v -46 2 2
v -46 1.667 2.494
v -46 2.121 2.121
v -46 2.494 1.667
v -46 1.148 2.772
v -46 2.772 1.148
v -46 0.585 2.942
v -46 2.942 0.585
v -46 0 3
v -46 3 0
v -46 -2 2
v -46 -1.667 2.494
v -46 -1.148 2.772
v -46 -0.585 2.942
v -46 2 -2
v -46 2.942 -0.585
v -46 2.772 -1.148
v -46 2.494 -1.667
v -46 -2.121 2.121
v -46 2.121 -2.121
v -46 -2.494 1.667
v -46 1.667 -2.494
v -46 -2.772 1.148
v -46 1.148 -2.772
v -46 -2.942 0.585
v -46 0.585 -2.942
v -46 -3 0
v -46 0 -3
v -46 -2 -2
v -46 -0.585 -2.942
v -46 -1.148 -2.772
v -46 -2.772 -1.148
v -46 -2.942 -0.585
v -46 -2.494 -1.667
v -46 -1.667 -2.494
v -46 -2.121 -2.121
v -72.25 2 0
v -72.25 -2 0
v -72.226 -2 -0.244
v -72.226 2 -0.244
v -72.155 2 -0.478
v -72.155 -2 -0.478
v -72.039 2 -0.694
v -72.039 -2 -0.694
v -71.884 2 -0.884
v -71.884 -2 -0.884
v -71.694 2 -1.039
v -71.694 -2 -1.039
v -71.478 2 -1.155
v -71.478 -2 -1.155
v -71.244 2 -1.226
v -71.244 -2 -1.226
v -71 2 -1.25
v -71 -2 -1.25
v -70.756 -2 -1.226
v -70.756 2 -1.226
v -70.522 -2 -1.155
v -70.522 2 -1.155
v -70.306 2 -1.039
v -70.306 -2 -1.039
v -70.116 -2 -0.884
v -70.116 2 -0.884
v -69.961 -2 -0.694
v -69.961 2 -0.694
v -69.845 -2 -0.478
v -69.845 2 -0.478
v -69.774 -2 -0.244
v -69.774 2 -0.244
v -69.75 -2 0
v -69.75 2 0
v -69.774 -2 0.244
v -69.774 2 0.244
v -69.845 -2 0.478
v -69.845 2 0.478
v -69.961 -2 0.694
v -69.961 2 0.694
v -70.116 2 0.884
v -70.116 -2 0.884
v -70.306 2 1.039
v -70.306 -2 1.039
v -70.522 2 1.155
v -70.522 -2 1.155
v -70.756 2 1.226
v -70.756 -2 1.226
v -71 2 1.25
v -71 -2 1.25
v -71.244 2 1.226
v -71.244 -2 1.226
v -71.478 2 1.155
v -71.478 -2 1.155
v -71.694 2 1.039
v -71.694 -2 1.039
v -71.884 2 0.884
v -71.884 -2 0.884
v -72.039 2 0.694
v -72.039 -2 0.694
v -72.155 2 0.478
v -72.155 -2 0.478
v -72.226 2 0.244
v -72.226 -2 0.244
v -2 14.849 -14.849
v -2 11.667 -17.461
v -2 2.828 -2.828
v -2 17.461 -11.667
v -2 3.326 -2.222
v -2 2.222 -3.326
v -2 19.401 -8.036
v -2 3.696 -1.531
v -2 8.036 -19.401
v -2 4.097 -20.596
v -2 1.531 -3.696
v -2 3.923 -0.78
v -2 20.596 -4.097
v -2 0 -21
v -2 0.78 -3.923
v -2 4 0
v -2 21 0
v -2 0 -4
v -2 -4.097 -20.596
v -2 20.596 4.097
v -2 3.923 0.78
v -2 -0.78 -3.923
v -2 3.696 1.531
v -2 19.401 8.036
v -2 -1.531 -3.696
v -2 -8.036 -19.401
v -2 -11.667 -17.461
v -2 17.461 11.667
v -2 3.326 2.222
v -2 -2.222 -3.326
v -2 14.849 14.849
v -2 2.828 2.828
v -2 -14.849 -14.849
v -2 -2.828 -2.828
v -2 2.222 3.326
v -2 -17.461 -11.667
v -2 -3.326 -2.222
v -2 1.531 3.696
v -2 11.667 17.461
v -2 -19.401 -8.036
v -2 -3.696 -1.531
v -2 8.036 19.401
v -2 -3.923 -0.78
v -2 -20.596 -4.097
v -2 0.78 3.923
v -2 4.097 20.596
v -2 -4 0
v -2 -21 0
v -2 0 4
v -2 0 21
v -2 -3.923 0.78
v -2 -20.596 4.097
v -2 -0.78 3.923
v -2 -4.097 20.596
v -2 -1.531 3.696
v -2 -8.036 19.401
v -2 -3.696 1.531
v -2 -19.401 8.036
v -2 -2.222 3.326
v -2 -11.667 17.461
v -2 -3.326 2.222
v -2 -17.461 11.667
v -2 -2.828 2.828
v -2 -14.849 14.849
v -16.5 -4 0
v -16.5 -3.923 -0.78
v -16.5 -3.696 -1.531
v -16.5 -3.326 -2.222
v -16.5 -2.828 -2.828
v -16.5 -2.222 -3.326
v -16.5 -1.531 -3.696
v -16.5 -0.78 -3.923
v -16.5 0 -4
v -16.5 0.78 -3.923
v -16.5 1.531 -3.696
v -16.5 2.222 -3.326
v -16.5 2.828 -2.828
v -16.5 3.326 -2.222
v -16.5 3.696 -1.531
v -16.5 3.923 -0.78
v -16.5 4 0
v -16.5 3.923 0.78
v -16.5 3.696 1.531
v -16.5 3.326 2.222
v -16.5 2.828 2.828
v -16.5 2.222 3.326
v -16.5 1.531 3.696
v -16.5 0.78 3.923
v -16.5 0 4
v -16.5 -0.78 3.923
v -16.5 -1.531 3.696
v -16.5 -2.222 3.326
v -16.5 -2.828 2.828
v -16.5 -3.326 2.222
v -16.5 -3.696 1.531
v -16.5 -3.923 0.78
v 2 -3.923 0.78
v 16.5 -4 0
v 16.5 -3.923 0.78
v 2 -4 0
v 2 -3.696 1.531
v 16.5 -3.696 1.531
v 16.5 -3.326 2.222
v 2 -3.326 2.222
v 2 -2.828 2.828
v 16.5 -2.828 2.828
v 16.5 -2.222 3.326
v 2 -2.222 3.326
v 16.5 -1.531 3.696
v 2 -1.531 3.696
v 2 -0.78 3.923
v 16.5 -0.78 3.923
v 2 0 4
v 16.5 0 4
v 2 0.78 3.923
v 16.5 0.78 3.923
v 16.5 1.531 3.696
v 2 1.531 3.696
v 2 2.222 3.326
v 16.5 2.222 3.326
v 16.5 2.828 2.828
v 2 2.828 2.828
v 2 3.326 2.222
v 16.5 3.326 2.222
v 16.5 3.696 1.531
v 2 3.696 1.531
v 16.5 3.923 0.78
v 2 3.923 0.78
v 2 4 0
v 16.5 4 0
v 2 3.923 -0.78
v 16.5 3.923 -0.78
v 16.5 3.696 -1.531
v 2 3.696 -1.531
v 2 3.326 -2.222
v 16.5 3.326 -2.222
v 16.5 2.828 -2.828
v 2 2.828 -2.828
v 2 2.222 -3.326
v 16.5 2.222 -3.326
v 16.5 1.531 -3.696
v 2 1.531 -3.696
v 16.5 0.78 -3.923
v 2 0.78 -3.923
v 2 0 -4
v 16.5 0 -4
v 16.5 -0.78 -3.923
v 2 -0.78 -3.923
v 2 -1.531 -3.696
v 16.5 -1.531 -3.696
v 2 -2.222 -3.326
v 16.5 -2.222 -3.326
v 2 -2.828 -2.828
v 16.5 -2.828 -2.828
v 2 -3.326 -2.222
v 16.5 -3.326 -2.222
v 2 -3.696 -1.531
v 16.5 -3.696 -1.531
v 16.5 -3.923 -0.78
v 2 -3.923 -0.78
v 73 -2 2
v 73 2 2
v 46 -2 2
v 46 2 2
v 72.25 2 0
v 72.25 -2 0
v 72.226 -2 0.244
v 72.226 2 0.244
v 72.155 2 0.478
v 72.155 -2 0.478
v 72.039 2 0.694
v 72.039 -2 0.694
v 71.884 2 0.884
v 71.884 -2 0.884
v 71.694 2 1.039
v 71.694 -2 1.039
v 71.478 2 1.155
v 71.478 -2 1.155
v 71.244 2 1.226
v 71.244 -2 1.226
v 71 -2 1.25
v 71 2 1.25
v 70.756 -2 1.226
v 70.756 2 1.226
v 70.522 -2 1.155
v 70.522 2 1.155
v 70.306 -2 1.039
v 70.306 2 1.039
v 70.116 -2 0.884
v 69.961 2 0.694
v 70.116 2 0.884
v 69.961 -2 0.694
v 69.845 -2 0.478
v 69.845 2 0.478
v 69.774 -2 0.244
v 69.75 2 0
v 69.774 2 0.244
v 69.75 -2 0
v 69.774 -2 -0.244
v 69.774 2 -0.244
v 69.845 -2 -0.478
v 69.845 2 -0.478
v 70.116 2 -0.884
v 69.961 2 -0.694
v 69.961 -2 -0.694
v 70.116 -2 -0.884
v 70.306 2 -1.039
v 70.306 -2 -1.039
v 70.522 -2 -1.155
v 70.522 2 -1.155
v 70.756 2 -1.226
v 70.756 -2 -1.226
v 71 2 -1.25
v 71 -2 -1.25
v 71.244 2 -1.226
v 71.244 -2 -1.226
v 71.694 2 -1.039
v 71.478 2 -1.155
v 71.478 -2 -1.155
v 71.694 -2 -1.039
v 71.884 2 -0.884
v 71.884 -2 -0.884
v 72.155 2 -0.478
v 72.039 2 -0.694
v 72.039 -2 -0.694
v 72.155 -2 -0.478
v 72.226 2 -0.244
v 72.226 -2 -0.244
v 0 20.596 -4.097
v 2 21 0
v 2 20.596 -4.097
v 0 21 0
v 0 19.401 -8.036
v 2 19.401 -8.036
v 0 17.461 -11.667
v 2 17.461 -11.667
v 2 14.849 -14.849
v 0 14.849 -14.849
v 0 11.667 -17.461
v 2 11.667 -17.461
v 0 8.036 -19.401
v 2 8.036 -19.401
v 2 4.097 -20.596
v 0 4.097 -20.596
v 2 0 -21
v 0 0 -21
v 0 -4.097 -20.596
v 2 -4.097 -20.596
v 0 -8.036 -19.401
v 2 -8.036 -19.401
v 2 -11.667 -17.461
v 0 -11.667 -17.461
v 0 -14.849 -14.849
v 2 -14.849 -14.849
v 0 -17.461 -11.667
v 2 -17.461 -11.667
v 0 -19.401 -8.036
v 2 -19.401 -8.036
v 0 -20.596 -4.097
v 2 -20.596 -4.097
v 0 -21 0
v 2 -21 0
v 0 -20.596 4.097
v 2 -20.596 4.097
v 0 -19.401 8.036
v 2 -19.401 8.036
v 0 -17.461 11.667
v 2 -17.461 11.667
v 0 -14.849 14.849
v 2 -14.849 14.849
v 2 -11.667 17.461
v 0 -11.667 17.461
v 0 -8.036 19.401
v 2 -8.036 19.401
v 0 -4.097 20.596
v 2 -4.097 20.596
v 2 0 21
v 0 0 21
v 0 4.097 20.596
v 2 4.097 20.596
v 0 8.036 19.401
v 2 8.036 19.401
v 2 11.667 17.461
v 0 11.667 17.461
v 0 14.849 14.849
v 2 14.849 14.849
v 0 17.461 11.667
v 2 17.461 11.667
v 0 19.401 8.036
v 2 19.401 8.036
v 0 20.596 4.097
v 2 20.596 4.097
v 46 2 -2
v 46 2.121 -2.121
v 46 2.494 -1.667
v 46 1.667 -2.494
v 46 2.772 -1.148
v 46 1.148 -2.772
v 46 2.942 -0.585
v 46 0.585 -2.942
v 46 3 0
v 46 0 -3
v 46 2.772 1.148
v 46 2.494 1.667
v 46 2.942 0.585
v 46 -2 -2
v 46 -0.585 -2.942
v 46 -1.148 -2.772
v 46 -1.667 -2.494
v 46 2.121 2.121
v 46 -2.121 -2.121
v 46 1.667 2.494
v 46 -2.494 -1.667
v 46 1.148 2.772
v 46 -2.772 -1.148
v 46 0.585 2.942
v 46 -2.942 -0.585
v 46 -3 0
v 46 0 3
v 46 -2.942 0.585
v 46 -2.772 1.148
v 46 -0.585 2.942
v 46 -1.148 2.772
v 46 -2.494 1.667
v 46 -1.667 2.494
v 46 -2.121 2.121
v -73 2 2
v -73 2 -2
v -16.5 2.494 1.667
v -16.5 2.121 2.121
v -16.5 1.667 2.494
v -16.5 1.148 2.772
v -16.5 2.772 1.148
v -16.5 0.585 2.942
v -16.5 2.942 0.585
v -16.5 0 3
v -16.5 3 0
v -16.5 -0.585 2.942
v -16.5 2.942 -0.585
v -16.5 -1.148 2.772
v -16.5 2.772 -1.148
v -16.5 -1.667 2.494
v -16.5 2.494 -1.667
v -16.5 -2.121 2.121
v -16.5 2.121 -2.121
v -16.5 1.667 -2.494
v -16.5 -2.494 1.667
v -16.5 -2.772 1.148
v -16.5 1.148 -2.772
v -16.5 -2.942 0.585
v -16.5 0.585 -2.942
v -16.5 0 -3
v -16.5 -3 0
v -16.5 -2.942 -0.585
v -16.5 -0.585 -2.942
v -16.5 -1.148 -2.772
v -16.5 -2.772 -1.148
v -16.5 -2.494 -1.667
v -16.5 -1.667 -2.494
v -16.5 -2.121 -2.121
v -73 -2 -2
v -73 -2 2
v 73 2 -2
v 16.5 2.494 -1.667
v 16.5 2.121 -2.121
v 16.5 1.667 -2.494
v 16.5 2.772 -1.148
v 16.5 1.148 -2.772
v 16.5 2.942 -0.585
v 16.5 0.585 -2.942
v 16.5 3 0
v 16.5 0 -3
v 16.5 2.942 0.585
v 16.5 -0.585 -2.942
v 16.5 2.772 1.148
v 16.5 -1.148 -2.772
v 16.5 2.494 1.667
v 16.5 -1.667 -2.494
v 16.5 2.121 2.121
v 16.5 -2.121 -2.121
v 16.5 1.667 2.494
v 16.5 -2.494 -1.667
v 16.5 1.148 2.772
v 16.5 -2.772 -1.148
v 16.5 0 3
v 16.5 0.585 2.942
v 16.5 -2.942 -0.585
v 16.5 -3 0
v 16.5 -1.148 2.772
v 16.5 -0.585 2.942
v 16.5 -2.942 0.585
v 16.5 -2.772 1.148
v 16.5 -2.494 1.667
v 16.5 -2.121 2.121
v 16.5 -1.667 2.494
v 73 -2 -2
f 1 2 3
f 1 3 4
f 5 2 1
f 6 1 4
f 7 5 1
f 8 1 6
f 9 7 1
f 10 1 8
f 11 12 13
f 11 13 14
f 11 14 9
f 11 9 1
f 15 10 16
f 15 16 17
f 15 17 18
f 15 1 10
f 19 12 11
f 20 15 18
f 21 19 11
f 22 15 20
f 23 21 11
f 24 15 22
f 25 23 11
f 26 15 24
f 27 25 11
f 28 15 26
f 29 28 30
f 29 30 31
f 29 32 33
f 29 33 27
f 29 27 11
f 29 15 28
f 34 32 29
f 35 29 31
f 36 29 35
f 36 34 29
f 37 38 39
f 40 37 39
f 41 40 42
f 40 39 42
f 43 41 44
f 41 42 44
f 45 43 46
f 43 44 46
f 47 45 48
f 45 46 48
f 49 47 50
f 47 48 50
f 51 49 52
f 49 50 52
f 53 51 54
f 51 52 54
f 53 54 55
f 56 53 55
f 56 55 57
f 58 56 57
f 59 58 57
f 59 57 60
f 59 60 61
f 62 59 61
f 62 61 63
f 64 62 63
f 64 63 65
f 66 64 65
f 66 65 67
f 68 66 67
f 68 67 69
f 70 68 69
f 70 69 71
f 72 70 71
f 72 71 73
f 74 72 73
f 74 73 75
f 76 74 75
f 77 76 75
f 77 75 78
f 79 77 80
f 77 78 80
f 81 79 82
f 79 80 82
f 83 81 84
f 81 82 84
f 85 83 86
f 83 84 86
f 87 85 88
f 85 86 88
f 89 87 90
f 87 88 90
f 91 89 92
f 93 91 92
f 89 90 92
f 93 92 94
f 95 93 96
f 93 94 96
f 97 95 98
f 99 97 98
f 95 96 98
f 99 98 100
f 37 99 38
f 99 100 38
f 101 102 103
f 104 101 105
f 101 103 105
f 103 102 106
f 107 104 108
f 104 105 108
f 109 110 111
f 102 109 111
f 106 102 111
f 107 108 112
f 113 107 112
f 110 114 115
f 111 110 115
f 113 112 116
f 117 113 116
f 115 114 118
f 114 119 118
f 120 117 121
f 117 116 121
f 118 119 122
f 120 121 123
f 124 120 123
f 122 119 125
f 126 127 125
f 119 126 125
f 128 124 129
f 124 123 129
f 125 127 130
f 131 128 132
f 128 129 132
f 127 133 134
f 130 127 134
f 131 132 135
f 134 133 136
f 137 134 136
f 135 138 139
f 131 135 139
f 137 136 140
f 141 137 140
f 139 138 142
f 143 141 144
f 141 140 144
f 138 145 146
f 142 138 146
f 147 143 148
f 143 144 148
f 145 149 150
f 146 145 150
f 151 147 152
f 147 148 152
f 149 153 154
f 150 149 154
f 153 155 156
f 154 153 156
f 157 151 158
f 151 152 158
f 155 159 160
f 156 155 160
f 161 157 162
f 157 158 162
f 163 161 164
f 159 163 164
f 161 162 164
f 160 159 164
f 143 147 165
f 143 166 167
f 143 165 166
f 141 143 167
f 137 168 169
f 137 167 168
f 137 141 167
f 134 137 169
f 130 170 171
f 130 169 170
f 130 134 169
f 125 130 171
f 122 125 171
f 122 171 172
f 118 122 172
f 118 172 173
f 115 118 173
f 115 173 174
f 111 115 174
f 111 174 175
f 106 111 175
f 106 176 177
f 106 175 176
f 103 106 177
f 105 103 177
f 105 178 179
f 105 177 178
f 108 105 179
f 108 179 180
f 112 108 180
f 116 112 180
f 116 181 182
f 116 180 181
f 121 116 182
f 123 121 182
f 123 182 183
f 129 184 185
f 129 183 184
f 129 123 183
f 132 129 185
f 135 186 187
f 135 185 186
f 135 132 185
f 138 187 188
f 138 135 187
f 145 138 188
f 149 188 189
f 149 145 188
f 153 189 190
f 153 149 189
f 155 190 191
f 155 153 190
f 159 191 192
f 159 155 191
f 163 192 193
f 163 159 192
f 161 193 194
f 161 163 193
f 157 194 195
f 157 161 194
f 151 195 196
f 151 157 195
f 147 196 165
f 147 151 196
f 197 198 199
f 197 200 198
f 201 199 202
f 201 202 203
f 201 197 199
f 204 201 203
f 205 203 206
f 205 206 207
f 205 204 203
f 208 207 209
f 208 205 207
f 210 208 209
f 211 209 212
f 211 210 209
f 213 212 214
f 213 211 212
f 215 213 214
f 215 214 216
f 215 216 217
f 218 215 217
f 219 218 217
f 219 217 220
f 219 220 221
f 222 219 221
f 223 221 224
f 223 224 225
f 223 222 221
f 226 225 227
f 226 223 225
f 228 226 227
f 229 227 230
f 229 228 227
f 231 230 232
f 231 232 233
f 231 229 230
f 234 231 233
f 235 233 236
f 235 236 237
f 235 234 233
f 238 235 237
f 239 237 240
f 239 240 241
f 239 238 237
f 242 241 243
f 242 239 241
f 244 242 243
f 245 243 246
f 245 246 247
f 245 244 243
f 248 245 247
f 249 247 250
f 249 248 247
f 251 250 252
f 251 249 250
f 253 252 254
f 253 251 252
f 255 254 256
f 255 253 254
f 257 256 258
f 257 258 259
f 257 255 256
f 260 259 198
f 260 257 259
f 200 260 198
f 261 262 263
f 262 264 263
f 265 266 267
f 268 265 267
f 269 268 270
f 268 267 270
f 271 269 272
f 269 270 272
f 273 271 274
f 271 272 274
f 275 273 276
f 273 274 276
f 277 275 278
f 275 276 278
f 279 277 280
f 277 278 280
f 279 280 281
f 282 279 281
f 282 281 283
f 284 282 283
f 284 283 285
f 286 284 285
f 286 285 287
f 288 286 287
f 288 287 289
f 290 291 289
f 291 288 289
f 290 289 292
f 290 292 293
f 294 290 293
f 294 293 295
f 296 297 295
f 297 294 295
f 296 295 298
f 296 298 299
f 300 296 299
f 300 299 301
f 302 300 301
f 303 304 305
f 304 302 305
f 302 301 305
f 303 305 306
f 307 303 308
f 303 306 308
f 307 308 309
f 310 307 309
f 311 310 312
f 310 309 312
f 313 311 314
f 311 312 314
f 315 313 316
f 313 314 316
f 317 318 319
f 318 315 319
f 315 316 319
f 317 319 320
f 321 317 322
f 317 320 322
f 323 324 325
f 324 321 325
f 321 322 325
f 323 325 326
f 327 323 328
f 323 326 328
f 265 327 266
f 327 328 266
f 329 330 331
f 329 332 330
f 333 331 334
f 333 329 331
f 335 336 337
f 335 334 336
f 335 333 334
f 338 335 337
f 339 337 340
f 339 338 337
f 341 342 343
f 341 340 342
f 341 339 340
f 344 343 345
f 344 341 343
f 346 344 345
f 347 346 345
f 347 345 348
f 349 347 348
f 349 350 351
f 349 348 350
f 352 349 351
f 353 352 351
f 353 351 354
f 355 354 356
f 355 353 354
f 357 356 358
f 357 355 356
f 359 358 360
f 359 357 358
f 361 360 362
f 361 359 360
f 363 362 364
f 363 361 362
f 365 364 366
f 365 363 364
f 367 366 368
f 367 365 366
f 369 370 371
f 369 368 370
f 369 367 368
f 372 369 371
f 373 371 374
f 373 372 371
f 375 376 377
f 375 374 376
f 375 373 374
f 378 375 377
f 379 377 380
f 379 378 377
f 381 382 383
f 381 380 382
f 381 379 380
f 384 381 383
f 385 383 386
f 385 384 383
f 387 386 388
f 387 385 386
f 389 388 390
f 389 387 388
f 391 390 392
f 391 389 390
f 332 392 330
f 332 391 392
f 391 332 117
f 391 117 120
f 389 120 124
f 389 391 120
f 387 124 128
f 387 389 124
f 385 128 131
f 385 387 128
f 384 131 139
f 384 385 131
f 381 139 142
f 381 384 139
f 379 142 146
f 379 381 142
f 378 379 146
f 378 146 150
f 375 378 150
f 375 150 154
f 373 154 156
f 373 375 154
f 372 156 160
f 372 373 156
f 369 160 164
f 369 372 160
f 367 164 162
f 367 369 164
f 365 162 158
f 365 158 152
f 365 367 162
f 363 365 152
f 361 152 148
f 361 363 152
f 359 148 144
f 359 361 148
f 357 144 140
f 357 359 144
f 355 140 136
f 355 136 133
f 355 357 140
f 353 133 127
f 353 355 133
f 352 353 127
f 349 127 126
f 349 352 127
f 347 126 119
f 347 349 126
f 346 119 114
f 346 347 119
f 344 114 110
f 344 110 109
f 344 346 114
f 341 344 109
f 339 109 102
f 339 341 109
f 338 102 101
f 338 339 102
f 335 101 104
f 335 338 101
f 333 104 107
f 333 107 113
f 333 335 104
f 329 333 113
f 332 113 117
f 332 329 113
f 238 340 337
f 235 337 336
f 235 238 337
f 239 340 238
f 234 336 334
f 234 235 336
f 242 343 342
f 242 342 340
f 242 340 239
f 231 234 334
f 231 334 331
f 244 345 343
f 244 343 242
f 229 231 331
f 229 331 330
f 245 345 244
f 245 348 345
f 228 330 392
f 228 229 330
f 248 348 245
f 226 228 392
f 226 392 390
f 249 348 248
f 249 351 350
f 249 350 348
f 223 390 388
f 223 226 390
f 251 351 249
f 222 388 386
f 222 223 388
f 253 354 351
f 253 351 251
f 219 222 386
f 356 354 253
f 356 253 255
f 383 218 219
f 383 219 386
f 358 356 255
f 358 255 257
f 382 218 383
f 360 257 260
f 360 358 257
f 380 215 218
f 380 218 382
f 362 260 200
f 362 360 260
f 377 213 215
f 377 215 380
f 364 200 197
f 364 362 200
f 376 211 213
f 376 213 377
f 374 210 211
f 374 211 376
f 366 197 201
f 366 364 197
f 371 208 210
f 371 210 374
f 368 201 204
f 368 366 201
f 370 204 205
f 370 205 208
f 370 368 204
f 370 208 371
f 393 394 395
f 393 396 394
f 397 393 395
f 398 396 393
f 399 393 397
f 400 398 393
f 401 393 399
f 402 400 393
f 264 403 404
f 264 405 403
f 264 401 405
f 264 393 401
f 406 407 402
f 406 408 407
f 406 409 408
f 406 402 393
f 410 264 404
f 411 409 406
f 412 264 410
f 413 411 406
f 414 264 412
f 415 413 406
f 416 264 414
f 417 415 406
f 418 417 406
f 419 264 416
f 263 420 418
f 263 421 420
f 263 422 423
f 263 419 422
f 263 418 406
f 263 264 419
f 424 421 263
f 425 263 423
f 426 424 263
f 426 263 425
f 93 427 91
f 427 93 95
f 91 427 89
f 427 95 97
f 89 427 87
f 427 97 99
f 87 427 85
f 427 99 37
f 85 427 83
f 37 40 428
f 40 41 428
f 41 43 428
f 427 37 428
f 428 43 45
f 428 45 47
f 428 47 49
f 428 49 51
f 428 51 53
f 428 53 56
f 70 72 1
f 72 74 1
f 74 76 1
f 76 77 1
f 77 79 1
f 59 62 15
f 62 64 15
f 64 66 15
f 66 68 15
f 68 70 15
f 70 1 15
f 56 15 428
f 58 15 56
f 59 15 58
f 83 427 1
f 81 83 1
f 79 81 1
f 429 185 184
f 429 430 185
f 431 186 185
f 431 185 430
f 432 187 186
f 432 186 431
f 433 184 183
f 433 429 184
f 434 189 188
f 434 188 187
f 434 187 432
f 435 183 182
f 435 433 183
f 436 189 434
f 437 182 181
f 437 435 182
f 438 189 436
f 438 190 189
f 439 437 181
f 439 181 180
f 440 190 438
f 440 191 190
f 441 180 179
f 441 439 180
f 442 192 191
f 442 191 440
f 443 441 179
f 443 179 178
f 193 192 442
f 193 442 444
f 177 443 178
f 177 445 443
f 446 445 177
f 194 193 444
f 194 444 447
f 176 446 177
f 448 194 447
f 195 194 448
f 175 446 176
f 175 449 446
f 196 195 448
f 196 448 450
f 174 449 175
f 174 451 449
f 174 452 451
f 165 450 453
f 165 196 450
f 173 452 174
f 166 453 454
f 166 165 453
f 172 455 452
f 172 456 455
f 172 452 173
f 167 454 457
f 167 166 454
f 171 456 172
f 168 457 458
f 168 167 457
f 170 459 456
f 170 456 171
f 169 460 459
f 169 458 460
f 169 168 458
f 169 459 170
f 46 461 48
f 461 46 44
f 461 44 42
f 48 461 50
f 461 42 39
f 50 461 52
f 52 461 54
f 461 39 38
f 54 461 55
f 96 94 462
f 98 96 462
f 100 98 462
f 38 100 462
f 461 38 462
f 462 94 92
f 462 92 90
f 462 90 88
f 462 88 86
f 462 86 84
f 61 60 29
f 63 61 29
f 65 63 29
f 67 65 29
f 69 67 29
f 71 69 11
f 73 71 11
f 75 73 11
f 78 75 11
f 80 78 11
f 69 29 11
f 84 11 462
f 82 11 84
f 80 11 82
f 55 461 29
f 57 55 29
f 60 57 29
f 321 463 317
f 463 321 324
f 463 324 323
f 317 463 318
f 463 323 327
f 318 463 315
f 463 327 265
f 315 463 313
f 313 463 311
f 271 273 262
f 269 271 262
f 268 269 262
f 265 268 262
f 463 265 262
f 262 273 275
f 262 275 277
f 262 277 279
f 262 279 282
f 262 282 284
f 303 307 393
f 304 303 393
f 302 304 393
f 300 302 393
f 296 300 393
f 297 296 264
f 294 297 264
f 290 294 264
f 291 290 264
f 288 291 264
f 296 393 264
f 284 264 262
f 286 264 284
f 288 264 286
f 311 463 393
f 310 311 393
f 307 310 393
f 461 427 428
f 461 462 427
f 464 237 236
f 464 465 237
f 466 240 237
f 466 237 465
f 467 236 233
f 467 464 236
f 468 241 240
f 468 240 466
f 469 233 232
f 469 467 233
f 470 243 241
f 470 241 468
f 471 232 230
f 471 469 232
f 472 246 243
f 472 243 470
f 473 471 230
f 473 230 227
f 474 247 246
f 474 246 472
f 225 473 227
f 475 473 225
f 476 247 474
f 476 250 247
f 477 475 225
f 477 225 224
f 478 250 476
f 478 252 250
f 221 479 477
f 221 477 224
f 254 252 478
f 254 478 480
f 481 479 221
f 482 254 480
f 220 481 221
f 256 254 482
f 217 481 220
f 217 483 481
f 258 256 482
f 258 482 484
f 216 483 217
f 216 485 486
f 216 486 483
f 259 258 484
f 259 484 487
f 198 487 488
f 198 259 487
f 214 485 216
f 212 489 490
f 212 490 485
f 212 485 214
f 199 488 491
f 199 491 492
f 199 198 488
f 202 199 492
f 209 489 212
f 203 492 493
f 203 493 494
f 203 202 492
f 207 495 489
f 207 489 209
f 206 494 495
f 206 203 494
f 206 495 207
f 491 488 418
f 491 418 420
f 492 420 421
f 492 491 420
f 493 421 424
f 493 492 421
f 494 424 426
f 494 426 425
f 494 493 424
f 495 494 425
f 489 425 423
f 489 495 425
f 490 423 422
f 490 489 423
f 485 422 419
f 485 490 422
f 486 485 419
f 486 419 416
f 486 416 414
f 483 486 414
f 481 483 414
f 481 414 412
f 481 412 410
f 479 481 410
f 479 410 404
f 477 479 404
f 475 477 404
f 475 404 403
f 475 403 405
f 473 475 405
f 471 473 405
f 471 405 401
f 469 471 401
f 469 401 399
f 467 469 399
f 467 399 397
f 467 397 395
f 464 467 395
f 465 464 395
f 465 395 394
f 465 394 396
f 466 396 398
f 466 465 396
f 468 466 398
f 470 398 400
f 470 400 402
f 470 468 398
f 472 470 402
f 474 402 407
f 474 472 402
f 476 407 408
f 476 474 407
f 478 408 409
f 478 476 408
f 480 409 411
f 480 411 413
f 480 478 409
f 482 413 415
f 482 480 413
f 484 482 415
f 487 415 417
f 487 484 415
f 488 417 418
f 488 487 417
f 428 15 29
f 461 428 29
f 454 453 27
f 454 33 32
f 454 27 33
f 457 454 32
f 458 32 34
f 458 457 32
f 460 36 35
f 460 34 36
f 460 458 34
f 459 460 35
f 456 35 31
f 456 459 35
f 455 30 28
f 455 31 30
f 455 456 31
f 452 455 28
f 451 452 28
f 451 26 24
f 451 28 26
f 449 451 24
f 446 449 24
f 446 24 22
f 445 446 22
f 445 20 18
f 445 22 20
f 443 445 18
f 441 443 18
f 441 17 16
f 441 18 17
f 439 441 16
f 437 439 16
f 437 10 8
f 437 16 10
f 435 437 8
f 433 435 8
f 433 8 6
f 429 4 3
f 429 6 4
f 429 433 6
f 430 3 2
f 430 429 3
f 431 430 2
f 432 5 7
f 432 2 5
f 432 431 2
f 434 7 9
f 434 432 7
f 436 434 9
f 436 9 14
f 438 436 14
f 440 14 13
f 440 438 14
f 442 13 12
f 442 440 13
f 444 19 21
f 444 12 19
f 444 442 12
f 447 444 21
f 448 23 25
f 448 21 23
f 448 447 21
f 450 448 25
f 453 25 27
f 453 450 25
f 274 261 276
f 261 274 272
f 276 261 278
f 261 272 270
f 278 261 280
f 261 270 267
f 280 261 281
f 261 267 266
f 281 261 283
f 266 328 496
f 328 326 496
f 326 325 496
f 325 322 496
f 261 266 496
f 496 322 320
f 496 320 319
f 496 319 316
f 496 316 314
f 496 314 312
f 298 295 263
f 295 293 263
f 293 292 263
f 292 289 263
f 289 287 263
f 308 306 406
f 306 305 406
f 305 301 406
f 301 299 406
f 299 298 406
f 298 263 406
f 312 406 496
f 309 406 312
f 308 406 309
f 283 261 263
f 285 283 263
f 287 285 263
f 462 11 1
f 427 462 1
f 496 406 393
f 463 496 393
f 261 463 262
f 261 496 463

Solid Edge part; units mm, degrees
sketch "Sketch1" plane through (0, 0, 0) normal (1, 0, 0) x (0, 1, 0)
  circle A0 centre (0, 0) radius 21
extrude "Protrusion1" add sketch "Sketch1" along normal mid plane 4
sketch "Sketch2" plane through (-2, 0, 0) normal (-1, 0, 0) x (0, -1, 0)
  circle A0 centre (0, 0) radius 4
extrude "ProtrusiónExtruida_3" add sketch "Sketch2" along normal blind 14.5
sketch "Sketch3" plane through (-16.5, 0, 0) normal (-1, 0, 0) x (0, -1, 0)
  circle A0 centre (0, 0) radius 3
extrude "ProtrusiónExtruida_4" add sketch "Sketch3" along normal blind 29.5
sketch "Sketch4" plane through (-46, 0, 0) normal (-1, 0, 0) x (0, -1, 0)
  line L0 (2, -2) -> (2, 2)
  line L1 (2, 2) -> (-2, 2)
  line L2 (-2, 2) -> (-2, -2)
  line L3 (-2, -2) -> (2, -2)
extrude "ProtrusiónExtruida_5" add sketch "Sketch4" along normal blind 27
mirror "Mirror1" about plane through (0, 0, 0) normal (1, 0, 0) of "ProtrusiónExtruida_3", "ProtrusiónExtruida_4", "ProtrusiónExtruida_5"
sketch "Sketch5" plane through (-58, -2, 0) normal (0, -1, 0) x (-1, 0, 0)
  circle A0 centre (13, 0) radius 1.25
extrude "Cutout1" cut sketch "Sketch5" against normal up to next
mirror "Mirror2" about plane through (0, 0, 0) normal (1, 0, 0) of "Cutout1"
